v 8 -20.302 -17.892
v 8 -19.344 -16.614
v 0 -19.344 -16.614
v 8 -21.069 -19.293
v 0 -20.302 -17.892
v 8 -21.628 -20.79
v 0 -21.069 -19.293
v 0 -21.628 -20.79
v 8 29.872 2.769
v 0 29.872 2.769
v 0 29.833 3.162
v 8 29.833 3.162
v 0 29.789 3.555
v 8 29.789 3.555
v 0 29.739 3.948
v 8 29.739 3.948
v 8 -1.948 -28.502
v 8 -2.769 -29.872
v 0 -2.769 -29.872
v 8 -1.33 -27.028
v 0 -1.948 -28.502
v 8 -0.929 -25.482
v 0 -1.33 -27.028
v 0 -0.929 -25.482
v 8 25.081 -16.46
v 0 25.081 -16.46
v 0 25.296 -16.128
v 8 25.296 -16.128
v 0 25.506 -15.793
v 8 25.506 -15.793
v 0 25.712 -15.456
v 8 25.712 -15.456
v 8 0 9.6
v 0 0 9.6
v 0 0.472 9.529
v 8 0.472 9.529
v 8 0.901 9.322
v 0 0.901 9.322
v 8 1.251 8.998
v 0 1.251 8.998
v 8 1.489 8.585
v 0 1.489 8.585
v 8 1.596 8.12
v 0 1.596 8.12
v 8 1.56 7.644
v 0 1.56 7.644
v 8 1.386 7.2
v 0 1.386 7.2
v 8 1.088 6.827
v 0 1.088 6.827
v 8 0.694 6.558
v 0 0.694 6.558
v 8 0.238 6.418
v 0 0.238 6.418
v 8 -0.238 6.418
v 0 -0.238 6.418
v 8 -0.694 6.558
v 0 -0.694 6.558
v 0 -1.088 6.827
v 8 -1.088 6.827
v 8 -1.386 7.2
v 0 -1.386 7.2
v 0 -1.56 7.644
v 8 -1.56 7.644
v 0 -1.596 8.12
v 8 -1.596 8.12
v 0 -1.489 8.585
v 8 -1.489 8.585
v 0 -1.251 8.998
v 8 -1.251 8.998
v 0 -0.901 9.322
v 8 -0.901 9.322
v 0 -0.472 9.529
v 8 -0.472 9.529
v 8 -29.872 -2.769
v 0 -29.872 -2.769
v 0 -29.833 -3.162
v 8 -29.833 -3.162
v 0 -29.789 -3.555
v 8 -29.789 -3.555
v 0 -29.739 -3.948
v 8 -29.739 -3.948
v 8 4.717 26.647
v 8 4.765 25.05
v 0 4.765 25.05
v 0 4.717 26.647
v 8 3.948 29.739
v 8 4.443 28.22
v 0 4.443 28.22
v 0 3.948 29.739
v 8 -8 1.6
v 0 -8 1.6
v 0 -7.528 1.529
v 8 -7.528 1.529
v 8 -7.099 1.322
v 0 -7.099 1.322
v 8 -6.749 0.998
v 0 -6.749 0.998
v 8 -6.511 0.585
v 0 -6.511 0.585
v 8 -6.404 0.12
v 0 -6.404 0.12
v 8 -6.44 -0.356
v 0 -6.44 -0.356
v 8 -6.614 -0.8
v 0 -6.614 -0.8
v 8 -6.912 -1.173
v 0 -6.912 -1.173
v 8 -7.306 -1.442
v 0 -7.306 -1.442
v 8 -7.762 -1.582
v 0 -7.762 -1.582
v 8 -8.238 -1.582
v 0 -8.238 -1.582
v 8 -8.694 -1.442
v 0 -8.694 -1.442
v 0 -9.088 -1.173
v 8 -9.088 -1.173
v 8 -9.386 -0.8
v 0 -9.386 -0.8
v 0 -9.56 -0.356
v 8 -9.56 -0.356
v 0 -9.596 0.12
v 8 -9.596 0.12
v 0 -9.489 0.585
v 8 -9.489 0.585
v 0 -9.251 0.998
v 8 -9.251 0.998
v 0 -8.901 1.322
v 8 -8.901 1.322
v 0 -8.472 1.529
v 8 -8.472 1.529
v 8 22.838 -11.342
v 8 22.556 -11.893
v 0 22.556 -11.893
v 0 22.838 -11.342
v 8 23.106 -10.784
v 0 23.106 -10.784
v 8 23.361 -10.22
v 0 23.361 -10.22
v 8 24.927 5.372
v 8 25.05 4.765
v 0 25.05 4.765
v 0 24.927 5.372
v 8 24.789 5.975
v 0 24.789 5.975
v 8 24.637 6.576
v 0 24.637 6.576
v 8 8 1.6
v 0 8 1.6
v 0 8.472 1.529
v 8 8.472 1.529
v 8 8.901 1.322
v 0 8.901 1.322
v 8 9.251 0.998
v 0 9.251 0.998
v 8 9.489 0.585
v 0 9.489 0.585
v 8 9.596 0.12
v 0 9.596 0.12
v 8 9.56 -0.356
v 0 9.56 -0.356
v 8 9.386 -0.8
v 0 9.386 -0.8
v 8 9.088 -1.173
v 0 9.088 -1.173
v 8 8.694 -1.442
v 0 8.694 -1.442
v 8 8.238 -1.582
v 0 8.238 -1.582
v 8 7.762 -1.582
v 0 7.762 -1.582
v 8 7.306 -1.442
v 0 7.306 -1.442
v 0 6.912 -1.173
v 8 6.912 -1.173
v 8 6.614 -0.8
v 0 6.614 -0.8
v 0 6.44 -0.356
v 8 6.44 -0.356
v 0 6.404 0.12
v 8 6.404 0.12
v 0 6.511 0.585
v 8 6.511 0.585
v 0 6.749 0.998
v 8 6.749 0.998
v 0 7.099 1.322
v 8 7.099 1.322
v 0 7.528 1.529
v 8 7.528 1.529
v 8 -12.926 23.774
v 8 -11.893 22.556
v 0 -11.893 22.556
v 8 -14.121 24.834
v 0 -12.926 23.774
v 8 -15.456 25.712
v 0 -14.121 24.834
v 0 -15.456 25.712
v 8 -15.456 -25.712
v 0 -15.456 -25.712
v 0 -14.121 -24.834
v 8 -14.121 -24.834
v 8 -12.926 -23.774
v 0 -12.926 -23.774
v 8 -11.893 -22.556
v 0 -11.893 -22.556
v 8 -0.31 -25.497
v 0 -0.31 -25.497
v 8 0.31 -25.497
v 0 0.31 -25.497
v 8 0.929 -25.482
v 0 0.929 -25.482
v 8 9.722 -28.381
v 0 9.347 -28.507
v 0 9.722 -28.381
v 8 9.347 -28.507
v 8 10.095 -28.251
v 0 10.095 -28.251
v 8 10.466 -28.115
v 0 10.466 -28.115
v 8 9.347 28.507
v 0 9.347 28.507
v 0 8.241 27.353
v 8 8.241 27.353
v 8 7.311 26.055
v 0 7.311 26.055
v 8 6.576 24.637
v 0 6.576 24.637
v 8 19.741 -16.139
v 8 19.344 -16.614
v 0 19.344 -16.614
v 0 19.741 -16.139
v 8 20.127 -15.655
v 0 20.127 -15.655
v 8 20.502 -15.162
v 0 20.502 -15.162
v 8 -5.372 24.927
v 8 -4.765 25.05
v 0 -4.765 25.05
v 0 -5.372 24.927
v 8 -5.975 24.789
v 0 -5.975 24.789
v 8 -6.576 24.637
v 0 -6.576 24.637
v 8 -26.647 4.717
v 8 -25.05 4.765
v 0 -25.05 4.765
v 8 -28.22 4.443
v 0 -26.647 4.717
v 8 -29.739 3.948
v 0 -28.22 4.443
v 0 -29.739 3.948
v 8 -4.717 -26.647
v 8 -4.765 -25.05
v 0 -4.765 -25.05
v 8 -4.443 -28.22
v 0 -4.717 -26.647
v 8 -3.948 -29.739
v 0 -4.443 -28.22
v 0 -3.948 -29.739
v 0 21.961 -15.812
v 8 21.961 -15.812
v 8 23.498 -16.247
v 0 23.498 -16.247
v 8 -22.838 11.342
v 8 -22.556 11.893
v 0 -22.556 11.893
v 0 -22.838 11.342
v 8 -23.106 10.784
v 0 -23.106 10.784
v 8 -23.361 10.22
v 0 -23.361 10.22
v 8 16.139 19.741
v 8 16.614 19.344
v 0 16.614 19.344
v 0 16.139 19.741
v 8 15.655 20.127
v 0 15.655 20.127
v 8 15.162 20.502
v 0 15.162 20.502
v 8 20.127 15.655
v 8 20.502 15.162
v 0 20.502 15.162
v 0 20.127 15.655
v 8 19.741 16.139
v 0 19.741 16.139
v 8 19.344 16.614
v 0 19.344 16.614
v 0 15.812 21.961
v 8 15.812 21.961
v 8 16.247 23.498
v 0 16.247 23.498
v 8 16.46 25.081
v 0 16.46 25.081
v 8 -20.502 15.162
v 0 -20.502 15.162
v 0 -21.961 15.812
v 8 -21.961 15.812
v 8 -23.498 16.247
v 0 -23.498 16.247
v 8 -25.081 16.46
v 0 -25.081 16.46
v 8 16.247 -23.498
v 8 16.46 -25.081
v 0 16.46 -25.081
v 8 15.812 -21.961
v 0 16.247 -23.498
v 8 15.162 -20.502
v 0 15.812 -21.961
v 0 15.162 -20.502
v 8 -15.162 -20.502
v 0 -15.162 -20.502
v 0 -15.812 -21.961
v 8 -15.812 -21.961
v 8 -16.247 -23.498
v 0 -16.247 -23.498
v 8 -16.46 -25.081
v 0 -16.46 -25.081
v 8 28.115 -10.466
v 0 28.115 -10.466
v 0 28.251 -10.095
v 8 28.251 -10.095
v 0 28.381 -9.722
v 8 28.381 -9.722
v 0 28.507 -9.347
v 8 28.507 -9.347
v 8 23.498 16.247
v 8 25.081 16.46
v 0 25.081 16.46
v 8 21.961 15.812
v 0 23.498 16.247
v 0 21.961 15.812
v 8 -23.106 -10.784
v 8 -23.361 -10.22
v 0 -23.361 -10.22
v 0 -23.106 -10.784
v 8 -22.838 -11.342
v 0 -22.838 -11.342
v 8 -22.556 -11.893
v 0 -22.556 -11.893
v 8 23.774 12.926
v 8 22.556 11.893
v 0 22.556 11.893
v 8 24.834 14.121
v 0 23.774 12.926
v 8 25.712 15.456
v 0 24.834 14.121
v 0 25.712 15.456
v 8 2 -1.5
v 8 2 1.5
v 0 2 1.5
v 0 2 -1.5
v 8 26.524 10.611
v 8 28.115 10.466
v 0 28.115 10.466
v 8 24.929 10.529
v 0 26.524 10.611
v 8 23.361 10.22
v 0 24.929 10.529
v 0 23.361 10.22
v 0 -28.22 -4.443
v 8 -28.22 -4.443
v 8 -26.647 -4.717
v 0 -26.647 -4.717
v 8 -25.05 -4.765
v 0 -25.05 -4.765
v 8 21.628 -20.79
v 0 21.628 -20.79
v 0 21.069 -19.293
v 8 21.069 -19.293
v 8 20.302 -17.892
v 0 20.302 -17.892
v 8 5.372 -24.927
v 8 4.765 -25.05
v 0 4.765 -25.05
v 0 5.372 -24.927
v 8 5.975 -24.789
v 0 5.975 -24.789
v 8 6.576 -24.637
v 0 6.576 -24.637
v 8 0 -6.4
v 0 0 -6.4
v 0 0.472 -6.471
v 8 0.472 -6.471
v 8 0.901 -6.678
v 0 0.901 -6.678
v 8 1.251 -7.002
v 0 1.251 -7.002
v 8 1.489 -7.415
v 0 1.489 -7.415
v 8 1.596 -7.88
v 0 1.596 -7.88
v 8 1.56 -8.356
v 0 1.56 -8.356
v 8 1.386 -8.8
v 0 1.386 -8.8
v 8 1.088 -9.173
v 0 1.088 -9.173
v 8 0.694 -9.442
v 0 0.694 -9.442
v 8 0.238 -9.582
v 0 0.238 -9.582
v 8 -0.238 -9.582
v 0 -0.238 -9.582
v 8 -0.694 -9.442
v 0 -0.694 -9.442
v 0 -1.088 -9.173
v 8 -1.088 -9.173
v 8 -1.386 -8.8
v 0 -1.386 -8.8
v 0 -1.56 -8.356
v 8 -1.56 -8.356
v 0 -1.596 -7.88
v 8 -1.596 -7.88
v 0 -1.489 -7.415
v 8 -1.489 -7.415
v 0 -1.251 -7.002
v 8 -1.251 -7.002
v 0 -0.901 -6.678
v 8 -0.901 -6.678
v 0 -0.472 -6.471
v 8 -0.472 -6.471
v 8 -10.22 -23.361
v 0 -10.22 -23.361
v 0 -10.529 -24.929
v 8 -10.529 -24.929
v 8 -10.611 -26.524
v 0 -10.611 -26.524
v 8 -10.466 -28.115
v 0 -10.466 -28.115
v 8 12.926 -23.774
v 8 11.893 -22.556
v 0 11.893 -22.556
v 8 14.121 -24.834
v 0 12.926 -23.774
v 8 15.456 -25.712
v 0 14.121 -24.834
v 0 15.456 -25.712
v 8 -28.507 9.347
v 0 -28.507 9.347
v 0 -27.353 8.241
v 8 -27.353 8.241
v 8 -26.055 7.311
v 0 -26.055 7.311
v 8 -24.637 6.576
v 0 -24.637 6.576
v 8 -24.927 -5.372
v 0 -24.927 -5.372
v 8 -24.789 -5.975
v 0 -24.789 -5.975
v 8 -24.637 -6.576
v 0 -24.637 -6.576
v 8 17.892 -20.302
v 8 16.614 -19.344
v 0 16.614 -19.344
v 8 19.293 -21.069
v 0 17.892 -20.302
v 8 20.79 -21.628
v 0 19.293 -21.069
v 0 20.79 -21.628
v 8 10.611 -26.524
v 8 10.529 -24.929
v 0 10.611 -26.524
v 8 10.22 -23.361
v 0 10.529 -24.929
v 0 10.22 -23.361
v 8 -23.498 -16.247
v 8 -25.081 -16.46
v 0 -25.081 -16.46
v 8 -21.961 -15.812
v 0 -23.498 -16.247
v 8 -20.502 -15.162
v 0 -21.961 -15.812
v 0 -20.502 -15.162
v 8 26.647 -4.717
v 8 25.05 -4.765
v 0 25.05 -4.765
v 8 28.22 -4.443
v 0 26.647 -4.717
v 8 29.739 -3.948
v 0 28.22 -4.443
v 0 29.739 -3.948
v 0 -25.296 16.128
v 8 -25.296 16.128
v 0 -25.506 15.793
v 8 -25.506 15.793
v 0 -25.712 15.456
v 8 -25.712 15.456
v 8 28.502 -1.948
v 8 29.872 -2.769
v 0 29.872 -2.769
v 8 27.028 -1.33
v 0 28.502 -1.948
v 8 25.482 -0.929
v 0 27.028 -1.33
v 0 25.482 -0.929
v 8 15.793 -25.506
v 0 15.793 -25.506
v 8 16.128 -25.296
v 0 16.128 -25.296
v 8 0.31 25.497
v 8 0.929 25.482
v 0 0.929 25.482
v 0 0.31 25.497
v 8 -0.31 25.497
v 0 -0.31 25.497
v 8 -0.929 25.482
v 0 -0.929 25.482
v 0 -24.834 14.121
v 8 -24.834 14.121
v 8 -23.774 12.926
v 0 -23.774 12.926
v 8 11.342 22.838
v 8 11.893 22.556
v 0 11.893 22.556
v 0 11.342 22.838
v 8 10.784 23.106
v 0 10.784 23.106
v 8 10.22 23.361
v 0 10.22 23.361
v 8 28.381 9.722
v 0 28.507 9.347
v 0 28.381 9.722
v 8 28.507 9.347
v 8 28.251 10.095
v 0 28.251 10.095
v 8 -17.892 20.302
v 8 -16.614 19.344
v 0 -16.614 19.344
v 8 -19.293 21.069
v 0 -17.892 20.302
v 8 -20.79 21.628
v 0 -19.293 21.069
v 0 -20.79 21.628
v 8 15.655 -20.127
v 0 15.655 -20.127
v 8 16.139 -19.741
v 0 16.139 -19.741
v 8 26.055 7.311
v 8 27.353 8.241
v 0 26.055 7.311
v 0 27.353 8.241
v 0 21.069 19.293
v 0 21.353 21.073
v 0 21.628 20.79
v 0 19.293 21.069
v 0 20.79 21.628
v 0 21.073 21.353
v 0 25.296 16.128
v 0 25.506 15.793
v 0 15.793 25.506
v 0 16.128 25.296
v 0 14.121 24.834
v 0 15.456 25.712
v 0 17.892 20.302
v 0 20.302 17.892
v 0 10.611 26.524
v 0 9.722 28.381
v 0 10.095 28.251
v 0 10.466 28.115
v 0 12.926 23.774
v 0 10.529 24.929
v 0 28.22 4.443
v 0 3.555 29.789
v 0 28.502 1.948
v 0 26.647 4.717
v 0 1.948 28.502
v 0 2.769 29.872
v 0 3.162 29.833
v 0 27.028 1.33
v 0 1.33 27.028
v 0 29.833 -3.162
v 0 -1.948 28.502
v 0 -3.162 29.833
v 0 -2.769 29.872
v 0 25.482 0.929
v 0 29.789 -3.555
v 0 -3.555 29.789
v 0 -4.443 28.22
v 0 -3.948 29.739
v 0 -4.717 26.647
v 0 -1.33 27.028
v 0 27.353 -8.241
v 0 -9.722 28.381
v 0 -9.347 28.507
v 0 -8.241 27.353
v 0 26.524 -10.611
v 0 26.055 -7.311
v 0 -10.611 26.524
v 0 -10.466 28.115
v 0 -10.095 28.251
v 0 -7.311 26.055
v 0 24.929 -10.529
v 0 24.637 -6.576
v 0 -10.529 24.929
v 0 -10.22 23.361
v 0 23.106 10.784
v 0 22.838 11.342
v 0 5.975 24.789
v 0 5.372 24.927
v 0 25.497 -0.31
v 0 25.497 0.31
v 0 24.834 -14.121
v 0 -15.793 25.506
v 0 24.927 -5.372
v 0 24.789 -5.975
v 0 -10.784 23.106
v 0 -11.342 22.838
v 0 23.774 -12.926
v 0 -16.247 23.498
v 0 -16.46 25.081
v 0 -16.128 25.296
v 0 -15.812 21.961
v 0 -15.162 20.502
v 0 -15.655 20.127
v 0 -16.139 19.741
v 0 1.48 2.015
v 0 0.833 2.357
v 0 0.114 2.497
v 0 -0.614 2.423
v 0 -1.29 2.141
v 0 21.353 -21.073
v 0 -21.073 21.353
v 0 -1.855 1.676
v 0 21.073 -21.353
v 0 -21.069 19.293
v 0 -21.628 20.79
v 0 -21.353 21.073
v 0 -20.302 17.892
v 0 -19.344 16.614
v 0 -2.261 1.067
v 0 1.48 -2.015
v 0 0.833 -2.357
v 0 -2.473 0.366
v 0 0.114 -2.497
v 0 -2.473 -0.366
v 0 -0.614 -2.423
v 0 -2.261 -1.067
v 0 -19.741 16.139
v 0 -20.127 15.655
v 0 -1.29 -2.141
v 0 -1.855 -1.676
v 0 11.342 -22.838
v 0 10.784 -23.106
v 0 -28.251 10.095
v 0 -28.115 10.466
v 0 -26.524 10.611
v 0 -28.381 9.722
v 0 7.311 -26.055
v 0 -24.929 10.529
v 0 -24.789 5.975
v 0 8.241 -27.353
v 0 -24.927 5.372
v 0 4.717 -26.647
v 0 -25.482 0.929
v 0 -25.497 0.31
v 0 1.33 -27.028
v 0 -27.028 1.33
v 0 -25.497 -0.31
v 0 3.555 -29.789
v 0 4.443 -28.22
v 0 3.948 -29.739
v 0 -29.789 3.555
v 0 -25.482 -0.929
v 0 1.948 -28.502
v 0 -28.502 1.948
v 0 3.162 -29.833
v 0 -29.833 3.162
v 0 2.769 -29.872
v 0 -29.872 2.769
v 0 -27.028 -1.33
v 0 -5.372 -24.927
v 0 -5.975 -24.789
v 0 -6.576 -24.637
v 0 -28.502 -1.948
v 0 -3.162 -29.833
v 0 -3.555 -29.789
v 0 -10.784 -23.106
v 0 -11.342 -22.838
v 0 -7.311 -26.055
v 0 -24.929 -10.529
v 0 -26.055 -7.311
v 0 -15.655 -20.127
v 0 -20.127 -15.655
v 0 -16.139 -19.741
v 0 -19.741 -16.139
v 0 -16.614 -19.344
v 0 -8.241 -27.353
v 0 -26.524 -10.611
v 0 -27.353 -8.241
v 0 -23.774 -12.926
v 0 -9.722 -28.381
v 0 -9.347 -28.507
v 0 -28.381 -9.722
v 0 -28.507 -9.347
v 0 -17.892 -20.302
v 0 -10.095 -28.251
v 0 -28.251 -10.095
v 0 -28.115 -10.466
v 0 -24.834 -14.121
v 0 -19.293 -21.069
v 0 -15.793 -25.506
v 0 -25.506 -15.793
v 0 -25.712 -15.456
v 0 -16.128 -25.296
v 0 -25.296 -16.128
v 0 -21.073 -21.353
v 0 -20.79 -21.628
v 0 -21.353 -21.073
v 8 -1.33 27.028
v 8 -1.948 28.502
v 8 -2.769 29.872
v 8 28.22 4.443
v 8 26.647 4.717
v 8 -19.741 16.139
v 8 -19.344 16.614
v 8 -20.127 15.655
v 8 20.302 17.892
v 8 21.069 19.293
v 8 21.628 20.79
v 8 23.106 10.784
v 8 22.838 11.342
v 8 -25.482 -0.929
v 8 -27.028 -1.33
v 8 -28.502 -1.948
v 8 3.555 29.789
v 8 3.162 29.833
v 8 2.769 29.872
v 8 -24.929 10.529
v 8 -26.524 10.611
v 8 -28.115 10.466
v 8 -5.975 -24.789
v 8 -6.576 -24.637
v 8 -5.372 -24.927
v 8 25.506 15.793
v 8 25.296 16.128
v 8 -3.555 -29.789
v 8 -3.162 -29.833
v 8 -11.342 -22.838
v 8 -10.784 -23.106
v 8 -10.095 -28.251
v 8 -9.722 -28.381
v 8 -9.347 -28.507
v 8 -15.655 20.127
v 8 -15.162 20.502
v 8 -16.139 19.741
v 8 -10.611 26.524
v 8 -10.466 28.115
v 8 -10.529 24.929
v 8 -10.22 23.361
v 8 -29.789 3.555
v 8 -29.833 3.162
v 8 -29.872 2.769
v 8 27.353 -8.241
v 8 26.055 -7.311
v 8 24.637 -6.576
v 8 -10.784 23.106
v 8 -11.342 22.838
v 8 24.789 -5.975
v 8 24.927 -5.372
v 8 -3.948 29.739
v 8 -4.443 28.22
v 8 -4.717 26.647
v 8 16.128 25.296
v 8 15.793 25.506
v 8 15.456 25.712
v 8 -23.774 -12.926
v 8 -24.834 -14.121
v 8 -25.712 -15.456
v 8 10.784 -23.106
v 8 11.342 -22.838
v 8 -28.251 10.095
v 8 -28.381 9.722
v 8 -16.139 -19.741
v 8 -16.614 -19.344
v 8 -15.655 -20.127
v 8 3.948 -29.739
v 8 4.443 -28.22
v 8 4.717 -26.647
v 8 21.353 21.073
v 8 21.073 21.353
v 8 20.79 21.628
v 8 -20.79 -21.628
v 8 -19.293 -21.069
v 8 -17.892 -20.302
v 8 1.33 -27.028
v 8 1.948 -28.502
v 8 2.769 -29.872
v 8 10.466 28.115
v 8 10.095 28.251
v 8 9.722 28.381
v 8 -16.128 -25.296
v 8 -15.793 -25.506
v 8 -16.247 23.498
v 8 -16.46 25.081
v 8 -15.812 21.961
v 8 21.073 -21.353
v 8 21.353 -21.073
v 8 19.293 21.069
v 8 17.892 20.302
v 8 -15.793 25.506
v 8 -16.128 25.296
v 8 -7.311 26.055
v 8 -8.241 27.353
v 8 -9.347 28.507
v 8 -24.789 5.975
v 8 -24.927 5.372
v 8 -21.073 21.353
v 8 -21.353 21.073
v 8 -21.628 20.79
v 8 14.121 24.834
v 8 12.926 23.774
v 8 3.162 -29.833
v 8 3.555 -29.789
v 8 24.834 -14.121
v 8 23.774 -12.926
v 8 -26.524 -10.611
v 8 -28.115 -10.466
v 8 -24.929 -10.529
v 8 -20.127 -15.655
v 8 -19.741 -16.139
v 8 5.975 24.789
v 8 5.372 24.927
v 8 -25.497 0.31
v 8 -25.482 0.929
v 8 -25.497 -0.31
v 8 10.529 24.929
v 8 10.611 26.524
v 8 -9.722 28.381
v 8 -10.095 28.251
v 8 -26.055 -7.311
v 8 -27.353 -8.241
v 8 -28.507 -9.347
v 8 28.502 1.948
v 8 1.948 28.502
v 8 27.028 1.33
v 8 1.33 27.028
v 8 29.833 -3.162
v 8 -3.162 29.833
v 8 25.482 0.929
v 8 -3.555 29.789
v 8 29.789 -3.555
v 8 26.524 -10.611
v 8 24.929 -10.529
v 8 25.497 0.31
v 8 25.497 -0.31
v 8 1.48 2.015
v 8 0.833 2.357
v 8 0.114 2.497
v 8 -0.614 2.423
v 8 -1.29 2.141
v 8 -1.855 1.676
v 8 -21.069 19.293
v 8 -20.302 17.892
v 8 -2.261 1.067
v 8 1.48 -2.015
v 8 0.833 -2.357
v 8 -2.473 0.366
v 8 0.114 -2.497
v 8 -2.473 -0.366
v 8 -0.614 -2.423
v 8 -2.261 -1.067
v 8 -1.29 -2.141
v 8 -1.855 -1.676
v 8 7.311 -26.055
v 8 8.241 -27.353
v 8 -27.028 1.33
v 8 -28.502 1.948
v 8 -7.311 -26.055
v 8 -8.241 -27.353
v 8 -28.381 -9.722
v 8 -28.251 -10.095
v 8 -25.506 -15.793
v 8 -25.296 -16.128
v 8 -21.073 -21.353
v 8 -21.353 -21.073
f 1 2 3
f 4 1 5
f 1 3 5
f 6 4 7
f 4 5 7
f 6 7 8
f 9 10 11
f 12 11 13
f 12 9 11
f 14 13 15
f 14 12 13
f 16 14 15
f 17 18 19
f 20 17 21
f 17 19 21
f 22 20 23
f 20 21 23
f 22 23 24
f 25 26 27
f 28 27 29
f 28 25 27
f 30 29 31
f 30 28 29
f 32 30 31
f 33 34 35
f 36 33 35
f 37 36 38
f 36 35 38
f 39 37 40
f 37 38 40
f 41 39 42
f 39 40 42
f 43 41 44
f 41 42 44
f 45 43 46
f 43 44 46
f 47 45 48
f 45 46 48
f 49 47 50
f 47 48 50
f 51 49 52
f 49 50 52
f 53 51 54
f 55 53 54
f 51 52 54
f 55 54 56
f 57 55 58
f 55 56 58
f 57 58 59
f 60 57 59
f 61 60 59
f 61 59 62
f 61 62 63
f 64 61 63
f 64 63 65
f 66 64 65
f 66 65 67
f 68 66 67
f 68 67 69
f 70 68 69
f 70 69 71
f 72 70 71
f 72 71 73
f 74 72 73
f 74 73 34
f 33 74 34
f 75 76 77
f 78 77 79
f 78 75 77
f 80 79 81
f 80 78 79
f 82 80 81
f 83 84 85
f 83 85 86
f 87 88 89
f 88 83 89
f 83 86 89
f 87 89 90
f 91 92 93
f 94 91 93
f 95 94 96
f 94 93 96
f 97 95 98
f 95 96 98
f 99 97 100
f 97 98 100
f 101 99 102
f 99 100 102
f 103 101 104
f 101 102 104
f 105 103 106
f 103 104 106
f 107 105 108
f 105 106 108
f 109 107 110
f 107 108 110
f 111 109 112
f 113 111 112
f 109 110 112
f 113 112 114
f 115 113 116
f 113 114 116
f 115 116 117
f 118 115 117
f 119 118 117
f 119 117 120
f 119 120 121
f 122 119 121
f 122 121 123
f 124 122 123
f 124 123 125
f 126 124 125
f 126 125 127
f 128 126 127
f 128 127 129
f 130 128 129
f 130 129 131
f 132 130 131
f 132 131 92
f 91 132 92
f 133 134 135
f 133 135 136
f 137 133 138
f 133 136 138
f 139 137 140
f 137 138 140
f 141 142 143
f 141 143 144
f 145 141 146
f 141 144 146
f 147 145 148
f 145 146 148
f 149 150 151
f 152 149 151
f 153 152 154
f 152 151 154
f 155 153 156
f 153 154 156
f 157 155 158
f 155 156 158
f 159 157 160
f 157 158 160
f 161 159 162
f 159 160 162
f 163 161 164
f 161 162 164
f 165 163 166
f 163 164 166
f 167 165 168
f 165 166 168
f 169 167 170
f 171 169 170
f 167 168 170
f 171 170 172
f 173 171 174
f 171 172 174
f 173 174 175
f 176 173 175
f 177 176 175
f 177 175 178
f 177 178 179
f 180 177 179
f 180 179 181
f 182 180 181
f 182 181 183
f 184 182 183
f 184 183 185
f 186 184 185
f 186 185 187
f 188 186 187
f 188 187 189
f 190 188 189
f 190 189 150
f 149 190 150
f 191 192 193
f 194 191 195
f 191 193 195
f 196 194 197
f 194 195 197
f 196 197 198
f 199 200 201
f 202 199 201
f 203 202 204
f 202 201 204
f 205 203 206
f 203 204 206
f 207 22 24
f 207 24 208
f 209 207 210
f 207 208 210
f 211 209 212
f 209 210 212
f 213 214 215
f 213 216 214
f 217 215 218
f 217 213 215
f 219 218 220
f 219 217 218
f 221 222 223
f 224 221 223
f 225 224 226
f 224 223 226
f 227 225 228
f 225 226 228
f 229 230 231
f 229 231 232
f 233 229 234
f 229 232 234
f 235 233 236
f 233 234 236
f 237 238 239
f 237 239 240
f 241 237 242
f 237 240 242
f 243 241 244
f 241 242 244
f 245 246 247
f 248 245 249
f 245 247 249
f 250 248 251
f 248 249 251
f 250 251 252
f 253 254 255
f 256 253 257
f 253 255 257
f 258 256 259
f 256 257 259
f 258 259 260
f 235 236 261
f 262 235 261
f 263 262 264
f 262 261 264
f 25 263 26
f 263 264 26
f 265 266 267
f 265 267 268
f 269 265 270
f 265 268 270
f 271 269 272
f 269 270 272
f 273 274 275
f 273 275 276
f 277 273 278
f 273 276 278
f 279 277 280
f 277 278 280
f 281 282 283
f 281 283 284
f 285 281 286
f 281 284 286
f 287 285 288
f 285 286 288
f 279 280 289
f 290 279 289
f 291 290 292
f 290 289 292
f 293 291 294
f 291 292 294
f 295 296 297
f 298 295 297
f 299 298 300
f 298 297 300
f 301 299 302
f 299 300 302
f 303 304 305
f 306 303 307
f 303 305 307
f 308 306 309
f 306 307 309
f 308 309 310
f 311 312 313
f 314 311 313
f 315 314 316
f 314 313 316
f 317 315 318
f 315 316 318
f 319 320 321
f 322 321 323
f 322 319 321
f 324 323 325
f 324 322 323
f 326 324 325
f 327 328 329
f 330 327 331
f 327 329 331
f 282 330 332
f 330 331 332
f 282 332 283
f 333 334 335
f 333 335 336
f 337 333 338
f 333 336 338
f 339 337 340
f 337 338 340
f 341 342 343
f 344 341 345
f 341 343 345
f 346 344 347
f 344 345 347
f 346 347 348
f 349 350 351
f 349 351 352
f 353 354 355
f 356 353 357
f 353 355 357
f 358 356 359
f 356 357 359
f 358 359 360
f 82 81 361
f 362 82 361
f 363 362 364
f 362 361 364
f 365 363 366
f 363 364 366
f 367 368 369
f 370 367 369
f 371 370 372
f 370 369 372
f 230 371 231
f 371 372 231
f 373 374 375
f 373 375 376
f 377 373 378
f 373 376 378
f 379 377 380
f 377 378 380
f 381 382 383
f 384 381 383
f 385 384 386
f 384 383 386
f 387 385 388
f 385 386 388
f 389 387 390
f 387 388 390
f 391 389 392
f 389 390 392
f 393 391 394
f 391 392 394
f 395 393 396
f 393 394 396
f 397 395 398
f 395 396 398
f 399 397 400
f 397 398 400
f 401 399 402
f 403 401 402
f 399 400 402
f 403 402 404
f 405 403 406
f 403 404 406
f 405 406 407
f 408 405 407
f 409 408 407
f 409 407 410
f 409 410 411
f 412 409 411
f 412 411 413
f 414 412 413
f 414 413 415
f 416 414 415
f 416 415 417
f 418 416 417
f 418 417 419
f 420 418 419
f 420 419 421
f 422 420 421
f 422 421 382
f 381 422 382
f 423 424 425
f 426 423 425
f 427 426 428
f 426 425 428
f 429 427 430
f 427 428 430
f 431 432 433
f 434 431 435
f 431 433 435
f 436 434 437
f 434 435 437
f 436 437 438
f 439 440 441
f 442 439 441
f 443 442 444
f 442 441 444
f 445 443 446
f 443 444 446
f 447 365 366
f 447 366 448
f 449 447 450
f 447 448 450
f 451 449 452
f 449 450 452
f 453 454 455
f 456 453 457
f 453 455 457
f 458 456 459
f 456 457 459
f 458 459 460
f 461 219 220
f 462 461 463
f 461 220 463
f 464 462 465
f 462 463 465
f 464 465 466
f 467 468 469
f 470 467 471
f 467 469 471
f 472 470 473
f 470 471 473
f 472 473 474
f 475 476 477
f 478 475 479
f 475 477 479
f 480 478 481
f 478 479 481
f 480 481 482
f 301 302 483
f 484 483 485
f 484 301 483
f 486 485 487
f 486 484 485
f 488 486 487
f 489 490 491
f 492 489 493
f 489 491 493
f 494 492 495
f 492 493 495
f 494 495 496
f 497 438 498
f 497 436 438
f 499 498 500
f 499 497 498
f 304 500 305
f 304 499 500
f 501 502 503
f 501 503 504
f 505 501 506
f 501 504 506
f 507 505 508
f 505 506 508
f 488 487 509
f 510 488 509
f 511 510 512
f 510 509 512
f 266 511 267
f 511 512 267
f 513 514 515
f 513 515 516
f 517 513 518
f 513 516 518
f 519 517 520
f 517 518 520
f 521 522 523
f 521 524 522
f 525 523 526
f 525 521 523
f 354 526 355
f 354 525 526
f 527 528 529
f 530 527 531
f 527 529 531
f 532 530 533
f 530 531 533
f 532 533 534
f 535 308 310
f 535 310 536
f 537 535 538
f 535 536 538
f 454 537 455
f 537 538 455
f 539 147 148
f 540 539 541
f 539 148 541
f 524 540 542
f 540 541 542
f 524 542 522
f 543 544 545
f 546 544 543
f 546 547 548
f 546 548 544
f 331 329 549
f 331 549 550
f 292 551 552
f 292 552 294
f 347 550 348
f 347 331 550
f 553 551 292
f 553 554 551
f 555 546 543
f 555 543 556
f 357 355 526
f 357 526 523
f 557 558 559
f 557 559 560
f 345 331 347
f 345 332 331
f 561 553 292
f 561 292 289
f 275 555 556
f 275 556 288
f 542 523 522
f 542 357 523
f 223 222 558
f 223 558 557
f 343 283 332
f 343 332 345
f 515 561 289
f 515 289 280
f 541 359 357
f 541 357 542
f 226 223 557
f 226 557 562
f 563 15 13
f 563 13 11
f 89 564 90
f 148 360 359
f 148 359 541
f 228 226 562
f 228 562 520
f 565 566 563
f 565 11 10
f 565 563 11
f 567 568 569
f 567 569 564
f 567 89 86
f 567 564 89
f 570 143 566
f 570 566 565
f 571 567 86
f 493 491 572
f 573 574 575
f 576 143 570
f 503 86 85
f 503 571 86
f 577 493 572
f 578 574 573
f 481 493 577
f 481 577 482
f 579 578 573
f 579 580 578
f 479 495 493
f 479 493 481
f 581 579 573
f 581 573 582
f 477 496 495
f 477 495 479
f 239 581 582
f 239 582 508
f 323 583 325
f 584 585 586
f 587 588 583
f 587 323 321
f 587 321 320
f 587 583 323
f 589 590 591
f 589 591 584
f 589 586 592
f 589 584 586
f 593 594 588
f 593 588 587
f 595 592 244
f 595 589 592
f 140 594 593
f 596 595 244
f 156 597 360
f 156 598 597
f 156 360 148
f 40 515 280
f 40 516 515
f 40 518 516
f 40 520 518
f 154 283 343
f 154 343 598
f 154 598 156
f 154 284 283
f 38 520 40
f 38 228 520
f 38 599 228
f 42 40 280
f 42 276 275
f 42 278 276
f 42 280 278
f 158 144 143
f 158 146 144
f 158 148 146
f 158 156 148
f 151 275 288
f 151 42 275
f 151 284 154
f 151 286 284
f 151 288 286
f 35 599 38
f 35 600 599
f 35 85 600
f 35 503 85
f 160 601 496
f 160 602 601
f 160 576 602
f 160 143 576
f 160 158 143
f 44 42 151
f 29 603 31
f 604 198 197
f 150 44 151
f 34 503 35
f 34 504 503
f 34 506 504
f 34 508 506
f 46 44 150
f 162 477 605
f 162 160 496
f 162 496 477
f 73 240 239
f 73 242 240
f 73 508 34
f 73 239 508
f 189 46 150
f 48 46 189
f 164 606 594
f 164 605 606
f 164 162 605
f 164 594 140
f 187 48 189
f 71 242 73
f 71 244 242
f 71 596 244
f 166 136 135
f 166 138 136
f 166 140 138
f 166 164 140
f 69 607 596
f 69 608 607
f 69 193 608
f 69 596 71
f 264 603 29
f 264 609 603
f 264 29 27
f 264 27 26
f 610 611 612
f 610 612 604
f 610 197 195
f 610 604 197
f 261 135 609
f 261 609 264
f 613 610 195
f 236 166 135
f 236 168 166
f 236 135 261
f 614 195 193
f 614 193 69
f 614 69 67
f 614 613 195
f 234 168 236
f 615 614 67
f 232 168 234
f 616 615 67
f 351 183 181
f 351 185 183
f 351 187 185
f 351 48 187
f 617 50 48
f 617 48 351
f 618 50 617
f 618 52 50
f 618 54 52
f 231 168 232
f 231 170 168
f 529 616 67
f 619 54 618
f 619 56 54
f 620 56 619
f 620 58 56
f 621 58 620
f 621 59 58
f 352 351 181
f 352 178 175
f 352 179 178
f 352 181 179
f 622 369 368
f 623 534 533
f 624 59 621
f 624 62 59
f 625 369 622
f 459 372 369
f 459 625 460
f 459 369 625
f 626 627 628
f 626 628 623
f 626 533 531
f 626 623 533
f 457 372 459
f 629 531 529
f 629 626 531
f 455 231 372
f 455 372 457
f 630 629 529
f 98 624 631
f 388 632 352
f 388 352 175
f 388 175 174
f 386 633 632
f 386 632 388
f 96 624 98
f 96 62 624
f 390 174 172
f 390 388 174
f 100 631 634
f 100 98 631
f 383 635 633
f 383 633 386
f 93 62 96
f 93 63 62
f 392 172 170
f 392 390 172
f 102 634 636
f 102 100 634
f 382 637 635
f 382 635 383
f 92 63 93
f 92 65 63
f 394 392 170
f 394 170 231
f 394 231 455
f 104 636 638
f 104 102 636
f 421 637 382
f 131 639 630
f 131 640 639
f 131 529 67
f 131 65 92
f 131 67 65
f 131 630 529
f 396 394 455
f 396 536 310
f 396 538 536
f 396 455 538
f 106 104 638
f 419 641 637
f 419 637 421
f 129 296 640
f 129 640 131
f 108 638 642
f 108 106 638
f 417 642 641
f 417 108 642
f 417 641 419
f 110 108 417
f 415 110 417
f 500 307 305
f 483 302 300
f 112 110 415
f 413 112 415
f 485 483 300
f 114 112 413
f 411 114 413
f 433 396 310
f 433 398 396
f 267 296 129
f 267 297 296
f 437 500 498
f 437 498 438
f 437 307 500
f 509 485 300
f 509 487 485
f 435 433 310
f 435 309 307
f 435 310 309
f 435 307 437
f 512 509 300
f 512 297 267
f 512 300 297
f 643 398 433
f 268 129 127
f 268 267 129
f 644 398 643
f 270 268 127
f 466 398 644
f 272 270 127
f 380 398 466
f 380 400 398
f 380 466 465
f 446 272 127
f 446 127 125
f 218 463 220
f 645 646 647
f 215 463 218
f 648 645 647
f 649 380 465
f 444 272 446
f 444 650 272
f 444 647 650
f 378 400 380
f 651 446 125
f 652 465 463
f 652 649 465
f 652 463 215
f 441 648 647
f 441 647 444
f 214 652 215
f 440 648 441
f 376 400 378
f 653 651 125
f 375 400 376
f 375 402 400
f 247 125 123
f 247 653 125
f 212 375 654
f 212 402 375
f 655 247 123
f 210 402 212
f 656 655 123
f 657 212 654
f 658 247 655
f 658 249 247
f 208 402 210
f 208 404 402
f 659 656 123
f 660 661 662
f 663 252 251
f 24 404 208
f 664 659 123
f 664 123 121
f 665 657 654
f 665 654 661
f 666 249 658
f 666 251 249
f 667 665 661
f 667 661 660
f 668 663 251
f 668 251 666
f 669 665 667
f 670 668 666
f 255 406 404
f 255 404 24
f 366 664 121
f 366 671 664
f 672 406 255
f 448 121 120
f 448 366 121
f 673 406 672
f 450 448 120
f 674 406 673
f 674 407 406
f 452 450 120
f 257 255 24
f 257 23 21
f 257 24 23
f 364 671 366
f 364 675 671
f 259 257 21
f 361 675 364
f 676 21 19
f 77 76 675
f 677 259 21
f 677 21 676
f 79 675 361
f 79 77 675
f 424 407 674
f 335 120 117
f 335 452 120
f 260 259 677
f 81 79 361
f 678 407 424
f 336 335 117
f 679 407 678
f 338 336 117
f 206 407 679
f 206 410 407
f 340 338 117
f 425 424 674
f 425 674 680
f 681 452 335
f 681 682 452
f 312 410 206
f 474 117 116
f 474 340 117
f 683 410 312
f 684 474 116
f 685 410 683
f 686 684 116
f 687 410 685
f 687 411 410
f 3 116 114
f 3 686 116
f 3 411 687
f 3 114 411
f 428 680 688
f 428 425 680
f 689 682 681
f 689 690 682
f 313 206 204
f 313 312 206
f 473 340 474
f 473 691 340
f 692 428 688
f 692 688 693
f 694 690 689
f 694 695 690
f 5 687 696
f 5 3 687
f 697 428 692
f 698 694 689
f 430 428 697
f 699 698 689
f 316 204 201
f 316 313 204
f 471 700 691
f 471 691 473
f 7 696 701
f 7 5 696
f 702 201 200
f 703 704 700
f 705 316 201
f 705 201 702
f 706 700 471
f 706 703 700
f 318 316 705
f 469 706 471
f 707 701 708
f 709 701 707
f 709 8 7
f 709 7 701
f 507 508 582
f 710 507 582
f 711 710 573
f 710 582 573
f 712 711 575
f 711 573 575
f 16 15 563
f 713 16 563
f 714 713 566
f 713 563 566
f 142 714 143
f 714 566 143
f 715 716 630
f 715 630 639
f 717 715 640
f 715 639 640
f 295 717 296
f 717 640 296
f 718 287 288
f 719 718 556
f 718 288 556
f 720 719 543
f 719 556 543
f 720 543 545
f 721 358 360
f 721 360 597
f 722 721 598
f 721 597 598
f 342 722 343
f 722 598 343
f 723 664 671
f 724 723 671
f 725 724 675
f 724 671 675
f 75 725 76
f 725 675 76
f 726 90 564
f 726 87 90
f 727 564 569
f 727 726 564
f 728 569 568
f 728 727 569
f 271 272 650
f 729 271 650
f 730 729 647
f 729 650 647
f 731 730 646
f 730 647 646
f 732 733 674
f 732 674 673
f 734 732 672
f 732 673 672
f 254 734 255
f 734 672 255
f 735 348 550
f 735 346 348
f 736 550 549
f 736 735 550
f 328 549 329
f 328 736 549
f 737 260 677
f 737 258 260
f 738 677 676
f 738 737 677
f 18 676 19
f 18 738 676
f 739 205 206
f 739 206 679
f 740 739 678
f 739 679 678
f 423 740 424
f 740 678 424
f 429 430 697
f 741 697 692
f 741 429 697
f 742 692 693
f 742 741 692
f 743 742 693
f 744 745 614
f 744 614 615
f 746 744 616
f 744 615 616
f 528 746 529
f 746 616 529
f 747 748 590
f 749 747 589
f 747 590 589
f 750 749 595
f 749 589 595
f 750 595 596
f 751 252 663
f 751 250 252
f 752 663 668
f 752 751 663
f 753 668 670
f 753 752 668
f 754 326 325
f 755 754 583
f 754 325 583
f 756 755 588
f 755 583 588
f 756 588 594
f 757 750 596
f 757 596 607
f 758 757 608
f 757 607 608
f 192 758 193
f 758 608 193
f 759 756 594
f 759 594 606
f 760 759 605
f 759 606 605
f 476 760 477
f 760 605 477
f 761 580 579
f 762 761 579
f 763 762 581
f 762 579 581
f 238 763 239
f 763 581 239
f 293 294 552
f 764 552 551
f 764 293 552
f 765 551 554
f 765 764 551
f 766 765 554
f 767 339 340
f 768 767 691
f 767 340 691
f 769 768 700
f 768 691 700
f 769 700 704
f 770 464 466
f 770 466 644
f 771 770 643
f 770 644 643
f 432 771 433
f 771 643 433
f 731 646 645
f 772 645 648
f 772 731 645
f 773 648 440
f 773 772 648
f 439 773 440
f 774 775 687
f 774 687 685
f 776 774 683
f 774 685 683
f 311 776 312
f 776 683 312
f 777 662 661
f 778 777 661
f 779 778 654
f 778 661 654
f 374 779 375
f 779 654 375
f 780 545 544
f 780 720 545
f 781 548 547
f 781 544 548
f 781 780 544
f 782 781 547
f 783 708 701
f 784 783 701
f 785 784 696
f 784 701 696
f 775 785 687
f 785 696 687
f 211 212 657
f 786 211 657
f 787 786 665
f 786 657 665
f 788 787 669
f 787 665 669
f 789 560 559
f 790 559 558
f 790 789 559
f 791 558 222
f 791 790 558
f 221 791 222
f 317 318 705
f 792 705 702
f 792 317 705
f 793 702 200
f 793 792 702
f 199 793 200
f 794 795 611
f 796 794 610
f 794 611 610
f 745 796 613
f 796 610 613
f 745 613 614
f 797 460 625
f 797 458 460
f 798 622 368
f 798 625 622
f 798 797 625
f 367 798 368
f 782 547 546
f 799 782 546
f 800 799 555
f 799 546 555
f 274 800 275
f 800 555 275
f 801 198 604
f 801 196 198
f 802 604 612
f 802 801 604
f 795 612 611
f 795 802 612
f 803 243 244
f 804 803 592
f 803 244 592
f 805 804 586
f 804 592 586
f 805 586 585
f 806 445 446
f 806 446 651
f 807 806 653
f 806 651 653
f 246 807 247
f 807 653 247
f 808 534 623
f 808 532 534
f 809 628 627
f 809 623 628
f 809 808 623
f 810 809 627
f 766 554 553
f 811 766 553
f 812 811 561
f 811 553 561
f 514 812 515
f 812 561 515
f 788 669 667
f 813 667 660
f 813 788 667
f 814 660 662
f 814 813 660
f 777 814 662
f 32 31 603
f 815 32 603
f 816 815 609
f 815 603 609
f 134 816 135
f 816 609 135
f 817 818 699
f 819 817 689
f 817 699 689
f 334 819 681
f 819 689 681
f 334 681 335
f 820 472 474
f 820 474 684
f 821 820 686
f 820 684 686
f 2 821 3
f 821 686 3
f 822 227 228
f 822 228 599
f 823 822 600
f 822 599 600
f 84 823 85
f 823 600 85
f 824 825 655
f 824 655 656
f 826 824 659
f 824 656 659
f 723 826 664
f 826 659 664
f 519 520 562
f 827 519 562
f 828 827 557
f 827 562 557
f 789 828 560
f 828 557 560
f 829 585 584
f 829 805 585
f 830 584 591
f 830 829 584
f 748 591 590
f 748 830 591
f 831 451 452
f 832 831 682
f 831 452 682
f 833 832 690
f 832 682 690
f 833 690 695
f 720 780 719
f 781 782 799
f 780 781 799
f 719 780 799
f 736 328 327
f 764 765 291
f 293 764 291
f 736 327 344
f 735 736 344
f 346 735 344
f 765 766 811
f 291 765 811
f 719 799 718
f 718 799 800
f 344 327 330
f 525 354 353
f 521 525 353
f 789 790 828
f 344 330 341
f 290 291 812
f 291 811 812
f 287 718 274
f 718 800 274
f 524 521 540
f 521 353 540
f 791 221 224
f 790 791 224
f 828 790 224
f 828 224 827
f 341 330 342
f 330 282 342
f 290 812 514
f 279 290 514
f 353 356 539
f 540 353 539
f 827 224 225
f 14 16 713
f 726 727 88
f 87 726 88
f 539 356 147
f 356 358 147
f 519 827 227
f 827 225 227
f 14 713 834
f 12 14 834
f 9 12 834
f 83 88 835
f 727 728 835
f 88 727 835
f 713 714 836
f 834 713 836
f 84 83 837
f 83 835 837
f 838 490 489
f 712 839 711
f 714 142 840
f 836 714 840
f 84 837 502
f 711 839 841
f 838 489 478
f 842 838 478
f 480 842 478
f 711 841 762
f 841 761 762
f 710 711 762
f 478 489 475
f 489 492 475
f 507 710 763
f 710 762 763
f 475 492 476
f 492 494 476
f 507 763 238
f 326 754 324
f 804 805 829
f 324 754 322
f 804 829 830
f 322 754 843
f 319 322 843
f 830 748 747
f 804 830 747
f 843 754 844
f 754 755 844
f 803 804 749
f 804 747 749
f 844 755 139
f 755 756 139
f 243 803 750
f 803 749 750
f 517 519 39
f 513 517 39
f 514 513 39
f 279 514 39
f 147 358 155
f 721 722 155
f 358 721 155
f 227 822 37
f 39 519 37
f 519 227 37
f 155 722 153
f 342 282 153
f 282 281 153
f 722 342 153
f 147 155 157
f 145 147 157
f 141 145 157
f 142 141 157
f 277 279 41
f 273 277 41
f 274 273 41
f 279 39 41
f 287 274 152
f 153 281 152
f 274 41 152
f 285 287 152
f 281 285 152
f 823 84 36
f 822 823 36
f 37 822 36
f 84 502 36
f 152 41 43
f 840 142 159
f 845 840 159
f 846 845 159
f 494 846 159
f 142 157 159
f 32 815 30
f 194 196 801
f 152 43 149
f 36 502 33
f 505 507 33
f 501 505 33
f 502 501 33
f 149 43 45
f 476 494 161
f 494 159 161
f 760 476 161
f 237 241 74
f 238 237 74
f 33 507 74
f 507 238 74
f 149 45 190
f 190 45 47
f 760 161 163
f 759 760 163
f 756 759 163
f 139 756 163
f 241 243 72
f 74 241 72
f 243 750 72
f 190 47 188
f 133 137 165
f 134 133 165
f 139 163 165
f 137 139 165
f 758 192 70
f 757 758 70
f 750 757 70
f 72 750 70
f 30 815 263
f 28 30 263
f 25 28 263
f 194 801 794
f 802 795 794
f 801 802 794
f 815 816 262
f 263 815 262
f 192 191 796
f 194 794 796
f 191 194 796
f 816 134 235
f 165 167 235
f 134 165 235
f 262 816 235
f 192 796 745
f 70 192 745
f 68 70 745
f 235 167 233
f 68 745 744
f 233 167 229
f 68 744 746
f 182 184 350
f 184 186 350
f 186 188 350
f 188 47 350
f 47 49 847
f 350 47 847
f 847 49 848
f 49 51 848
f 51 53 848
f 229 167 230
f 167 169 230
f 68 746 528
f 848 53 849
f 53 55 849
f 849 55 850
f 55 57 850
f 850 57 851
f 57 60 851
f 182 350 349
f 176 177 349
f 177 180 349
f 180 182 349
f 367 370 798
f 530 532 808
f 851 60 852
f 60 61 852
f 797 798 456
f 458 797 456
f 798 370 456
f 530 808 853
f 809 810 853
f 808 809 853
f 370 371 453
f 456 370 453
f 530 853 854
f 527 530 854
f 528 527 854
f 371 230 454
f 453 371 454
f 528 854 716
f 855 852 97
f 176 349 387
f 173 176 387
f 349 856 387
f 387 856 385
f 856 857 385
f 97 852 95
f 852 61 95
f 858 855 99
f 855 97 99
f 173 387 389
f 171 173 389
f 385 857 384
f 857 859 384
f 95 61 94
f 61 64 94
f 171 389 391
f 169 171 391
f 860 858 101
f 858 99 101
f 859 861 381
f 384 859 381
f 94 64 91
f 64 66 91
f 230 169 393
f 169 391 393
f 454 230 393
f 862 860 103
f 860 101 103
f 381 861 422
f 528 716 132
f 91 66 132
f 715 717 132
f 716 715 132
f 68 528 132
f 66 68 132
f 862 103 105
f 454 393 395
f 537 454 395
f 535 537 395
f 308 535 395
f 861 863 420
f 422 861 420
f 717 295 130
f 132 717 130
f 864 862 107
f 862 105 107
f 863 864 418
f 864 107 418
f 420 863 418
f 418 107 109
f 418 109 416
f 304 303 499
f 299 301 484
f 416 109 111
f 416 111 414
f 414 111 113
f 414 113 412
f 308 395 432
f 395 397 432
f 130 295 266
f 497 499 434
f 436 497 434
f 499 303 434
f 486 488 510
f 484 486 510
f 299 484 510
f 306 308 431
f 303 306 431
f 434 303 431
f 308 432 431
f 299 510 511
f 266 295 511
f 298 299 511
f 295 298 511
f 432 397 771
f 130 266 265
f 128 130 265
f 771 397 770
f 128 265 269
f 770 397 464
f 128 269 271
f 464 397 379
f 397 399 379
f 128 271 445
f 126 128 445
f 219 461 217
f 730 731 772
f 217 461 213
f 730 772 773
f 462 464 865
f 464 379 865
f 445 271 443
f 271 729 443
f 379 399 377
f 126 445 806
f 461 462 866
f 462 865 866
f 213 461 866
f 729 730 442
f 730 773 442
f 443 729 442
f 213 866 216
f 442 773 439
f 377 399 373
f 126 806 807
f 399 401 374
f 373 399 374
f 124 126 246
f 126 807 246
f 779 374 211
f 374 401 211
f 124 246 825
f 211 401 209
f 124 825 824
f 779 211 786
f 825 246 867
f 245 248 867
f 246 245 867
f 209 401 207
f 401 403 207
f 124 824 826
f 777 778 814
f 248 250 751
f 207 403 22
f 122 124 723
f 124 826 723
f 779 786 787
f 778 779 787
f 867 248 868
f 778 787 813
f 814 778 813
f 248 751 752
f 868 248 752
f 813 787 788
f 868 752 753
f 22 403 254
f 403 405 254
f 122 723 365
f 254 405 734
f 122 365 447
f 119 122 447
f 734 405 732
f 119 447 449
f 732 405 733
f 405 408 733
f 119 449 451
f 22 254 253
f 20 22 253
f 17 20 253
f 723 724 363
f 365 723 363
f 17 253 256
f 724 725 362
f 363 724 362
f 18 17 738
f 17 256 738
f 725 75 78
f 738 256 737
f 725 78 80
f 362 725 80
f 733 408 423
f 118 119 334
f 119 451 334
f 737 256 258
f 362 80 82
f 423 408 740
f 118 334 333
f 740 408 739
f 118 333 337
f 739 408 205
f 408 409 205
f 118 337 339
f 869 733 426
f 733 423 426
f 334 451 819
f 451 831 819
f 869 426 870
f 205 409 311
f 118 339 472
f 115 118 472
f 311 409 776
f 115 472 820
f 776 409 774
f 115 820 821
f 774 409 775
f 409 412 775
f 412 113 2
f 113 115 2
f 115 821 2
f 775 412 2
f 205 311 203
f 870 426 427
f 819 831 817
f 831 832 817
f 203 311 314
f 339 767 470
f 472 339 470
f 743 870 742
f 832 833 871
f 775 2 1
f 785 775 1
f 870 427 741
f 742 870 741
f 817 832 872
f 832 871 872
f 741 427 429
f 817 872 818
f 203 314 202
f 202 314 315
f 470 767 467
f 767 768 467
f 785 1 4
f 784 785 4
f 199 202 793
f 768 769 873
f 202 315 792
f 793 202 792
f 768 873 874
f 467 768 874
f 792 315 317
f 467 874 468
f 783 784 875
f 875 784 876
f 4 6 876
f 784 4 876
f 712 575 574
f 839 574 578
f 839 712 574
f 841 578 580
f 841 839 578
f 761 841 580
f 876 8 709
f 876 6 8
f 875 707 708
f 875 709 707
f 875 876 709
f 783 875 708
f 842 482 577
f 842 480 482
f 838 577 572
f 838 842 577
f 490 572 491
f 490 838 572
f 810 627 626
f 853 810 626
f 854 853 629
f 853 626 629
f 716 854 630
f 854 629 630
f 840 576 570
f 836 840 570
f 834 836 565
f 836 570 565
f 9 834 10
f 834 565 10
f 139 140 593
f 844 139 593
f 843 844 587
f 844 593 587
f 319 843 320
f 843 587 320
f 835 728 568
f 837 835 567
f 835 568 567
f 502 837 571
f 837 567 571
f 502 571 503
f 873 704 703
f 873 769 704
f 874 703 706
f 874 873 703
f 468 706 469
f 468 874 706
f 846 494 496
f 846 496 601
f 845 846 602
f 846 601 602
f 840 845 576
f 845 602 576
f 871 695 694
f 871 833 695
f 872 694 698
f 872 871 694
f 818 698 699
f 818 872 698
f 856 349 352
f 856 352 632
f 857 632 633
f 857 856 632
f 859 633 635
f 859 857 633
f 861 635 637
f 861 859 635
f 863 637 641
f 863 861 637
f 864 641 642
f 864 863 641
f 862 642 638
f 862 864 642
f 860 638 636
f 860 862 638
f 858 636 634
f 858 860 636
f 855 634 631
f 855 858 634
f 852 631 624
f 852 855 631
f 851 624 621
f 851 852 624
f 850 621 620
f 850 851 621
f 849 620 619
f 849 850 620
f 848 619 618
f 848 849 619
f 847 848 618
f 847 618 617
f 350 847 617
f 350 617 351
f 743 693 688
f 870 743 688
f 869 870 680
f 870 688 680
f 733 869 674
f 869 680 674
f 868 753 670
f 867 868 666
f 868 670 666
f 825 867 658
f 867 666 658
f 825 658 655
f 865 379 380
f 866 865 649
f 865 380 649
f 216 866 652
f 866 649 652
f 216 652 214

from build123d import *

# Parameters (mm, degrees)
BASPROSKE_W              = 8
BASPROSKE_H              = 30
TOOTHCUT_DEPTH           = 44.17406629
TEETHCUTS_COUNT          = 28
TEETHCUTS_ANGLE          = 347.142857143
BORSKE_R                 = 0.1
BORE_DEPTH               = 50.0000508
TAGLIO_ESTRUSIONE1_DEPTH = 30
SCHIZZO2_R               = 1.6
TAGLIO_ESTRUSIONE2_DEPTH = 10


with BuildPart() as part:
    # BasProSke → Base-Revolve (revolve)
    with BuildSketch(Plane(origin=(0, 0, 0), x_dir=(1, 0, 0), z_dir=(0, 1, 0)), mode=Mode.PRIVATE) as base_revolve_sk:
        with Locations((4, 15)):
            Rectangle(BASPROSKE_W, BASPROSKE_H)
    revolve(base_revolve_sk.sketch.rotate(Axis((-10, 0, 0), (1, 0, 0)), 180), axis=Axis((-10, 0, 0), (1, 0, 0)))

    # TooCutSke → ToothCut (cut, through all)
    with BuildSketch(Plane(origin=(0, 0, 0), x_dir=(0, 0, -1), z_dir=(1, 0, 0))):
        with BuildLine():
            ThreePointArc((0.928503763, 25.482089431), (0, 25.499), (-0.928503763, 25.482089431))
            ThreePointArc((-0.928503763, 25.482089431), (-1.618524429, 27.789411612), (-2.78585155, 29.895880591))
            ThreePointArc((-2.78585155, 29.895880591), (0, 30.0254), (2.78585155, 29.895880591))
            ThreePointArc((2.78585155, 29.895880591), (1.618524429, 27.789411612), (0.928503763, 25.482089431))
        make_face()
    toothcut = extrude(amount=TOOTHCUT_DEPTH, mode=Mode.SUBTRACT)

    # TeethCuts: ToothCut ×28 about axis
    teethcuts_axis = Axis((-10, 0, 0), (1, 0, 0))
    for i in range(1, TEETHCUTS_COUNT):
        add(toothcut.rotate(teethcuts_axis, i * TEETHCUTS_ANGLE / (TEETHCUTS_COUNT - 1)), mode=Mode.SUBTRACT)

    # BorSke → Bore (cut, symmetric)
    with BuildSketch(Plane(origin=(0, 0, 0), x_dir=(0, 0, -1), z_dir=(1, 0, 0))):
        with Locations(Location((0, 0, 0), (0, 0, 180))):
            Circle(BORSKE_R)
    extrude(amount=BORE_DEPTH, both=True, mode=Mode.SUBTRACT)

    # Schizzo1 → Taglio-Estrusione1 (cut)
    with BuildSketch(Plane(origin=(8, 0, 0), x_dir=(0, 0, -1), z_dir=(1, 0, 0))):
        with BuildLine():
            Line((-1.5, 2), (1.5, 2))
            ThreePointArc((1.5, 2), (0, -2.5), (-1.5, 2))
        make_face()
    extrude(amount=-TAGLIO_ESTRUSIONE1_DEPTH, mode=Mode.SUBTRACT)

    # Schizzo2 → Taglio-Estrusione2 (cut)
    with BuildSketch(Plane.ZY):
        with Locations((0, 8)):
            Circle(SCHIZZO2_R)
        with Locations((8, 0)):
            Circle(SCHIZZO2_R)
        with Locations((0, -8)):
            Circle(SCHIZZO2_R)
        with Locations((-8, 0)):
            Circle(SCHIZZO2_R)
    extrude(amount=-TAGLIO_ESTRUSIONE2_DEPTH, mode=Mode.SUBTRACT)


solid = part.part
